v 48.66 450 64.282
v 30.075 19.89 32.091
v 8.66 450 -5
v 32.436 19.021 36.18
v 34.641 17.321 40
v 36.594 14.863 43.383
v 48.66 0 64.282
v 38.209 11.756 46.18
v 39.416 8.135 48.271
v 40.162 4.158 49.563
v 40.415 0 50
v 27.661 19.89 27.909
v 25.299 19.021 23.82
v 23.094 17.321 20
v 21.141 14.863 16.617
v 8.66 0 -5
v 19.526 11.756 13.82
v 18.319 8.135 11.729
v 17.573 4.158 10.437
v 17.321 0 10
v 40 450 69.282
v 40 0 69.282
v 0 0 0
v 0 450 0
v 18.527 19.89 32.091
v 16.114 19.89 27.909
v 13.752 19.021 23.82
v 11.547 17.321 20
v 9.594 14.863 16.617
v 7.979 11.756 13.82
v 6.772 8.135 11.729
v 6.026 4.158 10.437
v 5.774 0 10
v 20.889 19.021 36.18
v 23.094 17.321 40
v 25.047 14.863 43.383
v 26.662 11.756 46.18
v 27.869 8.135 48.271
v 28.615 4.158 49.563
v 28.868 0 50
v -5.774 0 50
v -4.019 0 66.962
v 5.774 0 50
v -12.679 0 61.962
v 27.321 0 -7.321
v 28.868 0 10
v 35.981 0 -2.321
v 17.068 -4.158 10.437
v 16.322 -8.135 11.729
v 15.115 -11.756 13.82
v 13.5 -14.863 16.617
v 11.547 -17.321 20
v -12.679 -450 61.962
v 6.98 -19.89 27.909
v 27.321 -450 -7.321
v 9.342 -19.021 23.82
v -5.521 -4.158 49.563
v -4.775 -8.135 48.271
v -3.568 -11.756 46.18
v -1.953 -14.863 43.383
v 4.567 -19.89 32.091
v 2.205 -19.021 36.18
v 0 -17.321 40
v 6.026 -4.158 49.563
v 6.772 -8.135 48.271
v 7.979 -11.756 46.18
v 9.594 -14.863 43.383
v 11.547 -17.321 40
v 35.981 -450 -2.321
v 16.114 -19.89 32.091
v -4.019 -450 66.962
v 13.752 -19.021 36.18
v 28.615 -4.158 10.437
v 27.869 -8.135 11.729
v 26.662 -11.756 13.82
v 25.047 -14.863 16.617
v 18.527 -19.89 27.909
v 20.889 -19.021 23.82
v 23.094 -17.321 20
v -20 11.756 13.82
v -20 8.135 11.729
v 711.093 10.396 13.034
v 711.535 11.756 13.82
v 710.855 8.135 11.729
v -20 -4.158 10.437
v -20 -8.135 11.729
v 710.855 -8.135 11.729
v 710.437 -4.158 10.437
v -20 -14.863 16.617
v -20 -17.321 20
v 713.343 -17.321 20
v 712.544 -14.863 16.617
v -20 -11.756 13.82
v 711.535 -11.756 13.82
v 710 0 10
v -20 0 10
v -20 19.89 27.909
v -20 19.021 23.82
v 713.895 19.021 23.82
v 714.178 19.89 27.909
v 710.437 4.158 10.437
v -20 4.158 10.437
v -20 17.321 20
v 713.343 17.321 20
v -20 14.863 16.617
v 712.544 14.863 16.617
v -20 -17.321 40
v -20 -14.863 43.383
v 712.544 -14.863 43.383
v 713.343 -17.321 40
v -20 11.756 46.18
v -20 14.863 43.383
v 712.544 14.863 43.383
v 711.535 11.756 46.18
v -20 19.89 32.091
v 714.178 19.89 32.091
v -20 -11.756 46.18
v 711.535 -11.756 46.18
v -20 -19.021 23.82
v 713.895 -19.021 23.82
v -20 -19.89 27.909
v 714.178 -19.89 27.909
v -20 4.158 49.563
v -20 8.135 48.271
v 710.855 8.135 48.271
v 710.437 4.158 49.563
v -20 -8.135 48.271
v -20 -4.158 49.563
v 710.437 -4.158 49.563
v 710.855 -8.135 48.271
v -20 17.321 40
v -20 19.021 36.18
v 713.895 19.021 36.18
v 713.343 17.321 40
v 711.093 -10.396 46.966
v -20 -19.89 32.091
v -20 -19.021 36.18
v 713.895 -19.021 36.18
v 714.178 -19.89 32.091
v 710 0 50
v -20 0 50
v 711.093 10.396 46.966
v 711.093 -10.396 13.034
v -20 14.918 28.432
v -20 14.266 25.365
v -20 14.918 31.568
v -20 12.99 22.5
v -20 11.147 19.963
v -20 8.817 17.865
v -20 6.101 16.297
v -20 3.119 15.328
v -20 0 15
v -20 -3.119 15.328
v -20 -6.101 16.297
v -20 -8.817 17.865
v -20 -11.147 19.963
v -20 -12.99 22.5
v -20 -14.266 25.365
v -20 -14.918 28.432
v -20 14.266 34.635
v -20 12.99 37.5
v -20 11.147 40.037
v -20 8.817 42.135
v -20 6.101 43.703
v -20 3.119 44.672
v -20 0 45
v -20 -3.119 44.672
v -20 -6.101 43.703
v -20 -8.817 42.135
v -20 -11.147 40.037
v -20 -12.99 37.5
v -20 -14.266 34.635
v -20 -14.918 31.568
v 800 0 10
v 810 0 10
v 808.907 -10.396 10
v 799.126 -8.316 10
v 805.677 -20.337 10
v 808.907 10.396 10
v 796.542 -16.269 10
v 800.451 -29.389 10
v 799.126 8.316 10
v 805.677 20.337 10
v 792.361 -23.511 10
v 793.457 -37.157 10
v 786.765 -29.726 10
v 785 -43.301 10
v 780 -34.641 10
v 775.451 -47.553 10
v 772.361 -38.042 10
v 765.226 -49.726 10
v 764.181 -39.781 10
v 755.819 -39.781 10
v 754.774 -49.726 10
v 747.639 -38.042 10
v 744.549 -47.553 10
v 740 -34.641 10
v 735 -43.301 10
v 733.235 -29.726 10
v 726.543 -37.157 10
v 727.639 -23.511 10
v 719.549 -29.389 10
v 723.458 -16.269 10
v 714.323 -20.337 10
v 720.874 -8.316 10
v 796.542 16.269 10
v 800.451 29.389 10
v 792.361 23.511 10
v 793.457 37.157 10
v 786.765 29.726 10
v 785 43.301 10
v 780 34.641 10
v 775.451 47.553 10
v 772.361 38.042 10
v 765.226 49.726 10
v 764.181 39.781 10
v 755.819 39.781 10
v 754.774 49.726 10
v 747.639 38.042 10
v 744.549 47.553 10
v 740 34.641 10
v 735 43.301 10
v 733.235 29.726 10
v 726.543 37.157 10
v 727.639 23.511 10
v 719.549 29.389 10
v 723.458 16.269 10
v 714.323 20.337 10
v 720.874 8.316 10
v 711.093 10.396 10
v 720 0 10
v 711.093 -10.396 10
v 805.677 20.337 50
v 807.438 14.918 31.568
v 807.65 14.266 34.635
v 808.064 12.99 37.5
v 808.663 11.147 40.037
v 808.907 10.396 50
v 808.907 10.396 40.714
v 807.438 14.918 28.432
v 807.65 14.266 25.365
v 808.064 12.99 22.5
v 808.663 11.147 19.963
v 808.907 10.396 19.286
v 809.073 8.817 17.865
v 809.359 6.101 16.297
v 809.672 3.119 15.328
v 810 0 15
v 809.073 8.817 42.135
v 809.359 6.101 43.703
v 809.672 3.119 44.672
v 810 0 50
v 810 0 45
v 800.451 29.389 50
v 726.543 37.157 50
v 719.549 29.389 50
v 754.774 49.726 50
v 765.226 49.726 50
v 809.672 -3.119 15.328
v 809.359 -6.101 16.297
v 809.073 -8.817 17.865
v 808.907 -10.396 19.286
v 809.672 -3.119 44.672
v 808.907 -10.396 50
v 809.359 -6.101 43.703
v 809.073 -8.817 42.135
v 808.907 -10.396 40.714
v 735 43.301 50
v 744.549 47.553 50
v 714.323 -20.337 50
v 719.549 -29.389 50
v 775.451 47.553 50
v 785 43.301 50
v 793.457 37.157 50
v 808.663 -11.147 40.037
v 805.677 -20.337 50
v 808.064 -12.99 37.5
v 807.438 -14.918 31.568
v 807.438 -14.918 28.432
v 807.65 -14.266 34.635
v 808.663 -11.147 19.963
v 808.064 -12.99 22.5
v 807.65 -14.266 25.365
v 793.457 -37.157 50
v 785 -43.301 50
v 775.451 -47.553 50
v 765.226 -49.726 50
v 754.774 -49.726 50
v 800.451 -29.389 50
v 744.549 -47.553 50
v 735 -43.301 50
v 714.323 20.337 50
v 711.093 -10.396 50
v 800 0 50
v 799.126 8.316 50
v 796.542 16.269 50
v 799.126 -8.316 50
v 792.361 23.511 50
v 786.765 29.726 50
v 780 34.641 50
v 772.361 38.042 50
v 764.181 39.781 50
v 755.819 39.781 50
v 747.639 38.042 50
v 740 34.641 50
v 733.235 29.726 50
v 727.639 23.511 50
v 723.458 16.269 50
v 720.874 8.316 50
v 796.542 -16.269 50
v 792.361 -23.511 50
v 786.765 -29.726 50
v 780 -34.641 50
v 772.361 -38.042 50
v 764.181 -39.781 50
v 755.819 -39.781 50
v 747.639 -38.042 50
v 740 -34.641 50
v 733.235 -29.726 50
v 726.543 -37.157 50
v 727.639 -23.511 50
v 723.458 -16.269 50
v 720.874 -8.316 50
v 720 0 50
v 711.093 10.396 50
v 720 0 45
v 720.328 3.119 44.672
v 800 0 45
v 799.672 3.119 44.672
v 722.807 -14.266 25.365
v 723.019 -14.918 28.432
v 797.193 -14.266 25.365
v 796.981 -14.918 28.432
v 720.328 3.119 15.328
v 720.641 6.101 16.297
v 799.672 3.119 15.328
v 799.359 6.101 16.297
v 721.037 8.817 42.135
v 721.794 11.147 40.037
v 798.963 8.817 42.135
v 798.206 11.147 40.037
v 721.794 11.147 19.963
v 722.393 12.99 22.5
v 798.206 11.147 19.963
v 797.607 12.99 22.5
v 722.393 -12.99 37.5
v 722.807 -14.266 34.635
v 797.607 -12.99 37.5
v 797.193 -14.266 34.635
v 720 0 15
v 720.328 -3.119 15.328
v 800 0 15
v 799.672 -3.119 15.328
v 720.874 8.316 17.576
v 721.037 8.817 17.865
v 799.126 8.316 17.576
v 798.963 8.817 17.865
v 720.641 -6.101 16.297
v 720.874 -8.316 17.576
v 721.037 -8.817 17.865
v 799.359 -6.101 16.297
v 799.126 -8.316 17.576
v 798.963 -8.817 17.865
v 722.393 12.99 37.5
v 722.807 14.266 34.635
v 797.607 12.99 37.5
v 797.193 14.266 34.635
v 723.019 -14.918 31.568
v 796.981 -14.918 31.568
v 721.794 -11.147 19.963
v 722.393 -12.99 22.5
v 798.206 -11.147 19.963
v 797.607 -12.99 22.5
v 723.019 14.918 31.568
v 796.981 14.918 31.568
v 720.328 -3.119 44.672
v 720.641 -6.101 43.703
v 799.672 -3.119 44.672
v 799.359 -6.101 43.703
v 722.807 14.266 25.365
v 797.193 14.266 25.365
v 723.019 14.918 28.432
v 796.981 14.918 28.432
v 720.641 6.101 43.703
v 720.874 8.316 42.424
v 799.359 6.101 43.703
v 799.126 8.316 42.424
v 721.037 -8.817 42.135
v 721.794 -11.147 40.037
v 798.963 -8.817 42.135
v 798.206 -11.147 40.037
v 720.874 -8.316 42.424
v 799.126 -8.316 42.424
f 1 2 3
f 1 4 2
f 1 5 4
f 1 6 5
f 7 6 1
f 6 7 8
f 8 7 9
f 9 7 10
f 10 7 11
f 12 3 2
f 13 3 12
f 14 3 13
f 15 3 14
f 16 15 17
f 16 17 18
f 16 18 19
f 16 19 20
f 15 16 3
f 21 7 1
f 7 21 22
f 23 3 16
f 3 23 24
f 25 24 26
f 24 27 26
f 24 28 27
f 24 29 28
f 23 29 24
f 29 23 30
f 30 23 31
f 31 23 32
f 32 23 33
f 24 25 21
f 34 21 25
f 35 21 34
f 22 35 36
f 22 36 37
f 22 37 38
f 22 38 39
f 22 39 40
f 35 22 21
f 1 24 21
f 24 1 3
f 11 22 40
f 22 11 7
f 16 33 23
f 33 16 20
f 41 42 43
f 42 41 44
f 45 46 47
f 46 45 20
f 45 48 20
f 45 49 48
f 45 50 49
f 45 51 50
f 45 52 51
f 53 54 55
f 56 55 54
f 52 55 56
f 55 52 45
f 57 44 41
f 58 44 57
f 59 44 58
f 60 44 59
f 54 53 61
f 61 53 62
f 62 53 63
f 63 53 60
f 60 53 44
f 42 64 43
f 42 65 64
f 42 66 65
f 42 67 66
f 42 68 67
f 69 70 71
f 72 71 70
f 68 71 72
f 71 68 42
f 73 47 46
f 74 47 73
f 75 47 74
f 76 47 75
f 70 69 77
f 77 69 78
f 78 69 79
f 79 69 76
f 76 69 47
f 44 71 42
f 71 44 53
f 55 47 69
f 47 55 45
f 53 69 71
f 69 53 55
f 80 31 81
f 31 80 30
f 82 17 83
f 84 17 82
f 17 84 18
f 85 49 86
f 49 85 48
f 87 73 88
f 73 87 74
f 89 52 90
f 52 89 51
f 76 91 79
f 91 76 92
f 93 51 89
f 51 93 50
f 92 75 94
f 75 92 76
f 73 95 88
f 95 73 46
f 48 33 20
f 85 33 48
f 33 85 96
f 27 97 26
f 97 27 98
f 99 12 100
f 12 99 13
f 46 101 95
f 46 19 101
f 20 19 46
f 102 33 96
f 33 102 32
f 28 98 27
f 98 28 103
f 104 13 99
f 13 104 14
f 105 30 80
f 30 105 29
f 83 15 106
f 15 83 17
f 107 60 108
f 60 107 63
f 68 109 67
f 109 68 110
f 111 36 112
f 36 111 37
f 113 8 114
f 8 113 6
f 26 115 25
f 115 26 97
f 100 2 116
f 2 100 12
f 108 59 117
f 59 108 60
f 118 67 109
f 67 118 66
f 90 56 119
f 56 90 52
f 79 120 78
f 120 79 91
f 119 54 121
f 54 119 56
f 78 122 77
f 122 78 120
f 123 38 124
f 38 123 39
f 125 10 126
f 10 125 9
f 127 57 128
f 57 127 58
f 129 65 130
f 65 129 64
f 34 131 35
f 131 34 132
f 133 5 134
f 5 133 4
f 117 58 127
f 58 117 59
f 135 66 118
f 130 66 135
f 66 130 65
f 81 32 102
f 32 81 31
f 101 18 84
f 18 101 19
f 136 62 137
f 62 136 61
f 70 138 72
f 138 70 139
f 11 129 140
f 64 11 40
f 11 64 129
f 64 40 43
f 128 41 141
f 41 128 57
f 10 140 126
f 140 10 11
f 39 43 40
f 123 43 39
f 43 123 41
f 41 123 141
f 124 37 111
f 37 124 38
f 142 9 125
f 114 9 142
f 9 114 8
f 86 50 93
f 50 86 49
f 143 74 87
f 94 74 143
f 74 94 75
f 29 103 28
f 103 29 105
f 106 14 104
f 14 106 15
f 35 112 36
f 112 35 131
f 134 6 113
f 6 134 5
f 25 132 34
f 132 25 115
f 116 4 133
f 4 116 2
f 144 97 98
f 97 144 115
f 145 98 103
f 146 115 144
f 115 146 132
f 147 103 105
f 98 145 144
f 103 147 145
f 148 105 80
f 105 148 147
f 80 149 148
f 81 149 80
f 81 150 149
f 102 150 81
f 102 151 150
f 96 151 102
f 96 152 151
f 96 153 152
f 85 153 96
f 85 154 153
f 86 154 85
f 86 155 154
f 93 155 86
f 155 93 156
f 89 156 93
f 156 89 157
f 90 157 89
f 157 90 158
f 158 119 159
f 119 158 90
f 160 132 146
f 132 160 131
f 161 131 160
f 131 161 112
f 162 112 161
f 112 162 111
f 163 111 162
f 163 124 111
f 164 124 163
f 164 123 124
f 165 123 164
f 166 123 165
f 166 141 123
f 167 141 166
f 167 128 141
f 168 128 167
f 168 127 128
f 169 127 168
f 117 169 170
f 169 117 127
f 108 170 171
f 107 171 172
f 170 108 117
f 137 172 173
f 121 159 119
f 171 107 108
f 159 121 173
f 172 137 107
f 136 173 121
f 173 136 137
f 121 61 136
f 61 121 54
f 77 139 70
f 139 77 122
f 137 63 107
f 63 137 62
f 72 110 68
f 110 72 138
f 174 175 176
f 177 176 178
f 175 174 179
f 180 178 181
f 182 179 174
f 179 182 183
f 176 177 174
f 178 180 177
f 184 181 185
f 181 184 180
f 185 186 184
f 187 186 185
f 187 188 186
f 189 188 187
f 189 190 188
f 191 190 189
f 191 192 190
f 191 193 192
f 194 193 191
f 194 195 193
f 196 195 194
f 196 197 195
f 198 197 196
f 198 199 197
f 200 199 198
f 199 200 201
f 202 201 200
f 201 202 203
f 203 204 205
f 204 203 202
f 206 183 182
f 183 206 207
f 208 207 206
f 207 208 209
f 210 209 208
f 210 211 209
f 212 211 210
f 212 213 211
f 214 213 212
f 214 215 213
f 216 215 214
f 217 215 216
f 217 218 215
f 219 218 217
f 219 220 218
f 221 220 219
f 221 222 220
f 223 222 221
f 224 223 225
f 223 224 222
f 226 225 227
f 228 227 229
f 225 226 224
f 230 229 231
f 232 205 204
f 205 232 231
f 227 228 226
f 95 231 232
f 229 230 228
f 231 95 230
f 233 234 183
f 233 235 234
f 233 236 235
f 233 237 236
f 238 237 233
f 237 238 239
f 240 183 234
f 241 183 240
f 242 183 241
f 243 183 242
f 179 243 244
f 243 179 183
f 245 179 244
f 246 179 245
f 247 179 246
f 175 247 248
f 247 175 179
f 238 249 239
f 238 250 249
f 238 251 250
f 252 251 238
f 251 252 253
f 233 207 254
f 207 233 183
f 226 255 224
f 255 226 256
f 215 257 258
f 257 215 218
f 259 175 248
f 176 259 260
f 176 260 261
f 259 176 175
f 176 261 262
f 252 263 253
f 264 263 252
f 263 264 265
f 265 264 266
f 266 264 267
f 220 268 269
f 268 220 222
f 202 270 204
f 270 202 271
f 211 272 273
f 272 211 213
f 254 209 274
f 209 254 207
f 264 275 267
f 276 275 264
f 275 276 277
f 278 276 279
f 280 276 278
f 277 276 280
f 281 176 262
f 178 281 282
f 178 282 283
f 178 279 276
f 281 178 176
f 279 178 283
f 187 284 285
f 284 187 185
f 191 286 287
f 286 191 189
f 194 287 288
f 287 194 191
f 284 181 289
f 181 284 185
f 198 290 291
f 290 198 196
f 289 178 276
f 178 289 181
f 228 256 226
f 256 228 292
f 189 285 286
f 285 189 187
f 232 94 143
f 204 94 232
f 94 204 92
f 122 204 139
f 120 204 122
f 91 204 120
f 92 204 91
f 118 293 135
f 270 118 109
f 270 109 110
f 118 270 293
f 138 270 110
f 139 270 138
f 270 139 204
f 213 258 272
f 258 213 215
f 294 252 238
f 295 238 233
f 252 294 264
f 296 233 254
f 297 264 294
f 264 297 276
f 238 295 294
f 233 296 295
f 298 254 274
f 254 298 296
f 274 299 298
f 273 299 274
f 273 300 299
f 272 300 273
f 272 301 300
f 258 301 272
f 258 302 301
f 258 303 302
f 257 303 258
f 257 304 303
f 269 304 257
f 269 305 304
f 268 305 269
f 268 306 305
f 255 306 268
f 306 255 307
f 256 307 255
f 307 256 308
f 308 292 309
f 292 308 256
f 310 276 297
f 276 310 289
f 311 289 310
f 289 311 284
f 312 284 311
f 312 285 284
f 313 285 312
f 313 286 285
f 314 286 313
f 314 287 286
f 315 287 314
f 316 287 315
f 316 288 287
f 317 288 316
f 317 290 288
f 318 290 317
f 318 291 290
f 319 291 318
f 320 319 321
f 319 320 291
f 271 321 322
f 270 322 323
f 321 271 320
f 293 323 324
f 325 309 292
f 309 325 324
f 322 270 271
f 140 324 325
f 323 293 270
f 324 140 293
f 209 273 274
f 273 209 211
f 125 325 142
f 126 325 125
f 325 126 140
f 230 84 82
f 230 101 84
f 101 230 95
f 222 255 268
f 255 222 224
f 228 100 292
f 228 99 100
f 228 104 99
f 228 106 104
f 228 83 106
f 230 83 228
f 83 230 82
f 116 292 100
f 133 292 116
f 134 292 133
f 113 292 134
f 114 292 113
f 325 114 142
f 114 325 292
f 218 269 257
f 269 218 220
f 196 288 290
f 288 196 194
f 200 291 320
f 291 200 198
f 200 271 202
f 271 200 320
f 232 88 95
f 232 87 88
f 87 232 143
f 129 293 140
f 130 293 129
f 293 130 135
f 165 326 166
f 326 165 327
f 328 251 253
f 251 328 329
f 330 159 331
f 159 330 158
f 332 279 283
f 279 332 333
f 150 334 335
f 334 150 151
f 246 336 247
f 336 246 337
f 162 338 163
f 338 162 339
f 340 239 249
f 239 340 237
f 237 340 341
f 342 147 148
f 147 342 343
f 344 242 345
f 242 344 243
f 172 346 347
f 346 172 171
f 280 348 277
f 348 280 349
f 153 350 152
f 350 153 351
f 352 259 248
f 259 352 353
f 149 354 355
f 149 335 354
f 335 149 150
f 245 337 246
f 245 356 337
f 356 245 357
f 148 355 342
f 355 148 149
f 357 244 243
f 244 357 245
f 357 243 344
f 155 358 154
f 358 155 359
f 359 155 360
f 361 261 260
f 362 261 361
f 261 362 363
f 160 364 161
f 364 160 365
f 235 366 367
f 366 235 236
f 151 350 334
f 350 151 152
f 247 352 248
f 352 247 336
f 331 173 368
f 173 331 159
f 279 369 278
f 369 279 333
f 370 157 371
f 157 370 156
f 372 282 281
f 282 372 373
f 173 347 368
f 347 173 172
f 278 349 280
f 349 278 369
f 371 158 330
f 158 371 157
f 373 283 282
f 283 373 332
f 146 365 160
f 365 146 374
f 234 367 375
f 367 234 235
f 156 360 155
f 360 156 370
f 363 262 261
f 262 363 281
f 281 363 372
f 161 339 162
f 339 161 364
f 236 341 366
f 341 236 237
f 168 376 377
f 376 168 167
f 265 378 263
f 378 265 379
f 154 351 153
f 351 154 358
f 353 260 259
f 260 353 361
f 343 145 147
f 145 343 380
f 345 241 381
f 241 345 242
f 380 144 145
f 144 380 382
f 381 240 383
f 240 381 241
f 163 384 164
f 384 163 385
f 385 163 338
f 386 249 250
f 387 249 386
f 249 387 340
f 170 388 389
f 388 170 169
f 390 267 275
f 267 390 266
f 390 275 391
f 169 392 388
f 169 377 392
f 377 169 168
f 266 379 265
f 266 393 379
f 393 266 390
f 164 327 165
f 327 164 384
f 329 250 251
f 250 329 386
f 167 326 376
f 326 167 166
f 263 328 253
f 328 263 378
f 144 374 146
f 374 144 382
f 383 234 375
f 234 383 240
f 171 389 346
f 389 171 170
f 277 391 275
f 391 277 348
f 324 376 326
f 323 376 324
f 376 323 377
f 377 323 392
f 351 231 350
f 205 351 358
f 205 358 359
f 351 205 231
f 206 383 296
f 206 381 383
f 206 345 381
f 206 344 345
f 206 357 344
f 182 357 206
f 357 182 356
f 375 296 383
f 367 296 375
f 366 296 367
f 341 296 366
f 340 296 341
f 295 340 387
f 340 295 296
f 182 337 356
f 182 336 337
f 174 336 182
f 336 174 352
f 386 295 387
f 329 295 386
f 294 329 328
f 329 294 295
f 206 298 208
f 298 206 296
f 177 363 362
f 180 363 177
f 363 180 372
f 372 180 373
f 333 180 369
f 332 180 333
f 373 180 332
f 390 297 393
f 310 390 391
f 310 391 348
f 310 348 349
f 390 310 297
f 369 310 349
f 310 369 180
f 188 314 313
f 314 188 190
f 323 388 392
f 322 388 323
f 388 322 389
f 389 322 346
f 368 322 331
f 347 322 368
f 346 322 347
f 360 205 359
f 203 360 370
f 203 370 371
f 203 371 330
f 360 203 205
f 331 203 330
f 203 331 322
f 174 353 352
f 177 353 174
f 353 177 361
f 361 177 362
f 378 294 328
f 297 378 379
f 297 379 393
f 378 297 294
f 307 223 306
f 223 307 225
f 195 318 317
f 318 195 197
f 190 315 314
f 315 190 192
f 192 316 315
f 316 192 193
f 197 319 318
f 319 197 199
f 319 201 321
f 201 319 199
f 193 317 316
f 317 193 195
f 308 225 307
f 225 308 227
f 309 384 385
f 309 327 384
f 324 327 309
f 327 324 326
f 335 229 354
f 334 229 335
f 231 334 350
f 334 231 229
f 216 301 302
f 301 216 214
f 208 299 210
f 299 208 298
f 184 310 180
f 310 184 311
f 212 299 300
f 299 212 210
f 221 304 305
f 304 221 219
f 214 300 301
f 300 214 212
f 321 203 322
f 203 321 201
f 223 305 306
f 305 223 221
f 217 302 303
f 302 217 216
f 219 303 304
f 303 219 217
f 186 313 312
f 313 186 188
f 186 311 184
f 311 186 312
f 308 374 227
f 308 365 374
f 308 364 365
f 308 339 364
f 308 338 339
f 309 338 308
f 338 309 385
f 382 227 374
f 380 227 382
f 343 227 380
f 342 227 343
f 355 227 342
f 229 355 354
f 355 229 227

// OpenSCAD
//Spinning-Thingy

module hollow_thingy() {

    module solid_thingy() {


      //this is right wing
      rotate([0,30 ,0]){
              cube([10, 450, 80]);
      }


      //this is left wing
      rotate([0,-30,0]){
              translate([20,-450,-20]){
                      cube([10, 450, 80]);
              }
      }

      //this is the spinning shaft
      translate([-20, 0, 30 ]) {
              rotate([0,90,0]){
                      cylinder(h=800, r1=20, r2=20);
              }
      };


      ///this is the coin cell holder
      translate([760,0,10]) {
         cylinder(h=40, r1=50, r2=50);
      };


    };




    difference() {

      solid_thingy();

      //this is the spinning shaft
      translate([-20, 0, 30 ]) {
              rotate([0,90,0]){
                      cylinder(h=1000, r1=15, r2=15);
              }
      };

    }

}

difference() {

  hollow_thingy();

  ///this is the coin cell holder
  translate([760,0,10]) {
     cylinder(h=40, r1=40, r2=40);
  };

}
